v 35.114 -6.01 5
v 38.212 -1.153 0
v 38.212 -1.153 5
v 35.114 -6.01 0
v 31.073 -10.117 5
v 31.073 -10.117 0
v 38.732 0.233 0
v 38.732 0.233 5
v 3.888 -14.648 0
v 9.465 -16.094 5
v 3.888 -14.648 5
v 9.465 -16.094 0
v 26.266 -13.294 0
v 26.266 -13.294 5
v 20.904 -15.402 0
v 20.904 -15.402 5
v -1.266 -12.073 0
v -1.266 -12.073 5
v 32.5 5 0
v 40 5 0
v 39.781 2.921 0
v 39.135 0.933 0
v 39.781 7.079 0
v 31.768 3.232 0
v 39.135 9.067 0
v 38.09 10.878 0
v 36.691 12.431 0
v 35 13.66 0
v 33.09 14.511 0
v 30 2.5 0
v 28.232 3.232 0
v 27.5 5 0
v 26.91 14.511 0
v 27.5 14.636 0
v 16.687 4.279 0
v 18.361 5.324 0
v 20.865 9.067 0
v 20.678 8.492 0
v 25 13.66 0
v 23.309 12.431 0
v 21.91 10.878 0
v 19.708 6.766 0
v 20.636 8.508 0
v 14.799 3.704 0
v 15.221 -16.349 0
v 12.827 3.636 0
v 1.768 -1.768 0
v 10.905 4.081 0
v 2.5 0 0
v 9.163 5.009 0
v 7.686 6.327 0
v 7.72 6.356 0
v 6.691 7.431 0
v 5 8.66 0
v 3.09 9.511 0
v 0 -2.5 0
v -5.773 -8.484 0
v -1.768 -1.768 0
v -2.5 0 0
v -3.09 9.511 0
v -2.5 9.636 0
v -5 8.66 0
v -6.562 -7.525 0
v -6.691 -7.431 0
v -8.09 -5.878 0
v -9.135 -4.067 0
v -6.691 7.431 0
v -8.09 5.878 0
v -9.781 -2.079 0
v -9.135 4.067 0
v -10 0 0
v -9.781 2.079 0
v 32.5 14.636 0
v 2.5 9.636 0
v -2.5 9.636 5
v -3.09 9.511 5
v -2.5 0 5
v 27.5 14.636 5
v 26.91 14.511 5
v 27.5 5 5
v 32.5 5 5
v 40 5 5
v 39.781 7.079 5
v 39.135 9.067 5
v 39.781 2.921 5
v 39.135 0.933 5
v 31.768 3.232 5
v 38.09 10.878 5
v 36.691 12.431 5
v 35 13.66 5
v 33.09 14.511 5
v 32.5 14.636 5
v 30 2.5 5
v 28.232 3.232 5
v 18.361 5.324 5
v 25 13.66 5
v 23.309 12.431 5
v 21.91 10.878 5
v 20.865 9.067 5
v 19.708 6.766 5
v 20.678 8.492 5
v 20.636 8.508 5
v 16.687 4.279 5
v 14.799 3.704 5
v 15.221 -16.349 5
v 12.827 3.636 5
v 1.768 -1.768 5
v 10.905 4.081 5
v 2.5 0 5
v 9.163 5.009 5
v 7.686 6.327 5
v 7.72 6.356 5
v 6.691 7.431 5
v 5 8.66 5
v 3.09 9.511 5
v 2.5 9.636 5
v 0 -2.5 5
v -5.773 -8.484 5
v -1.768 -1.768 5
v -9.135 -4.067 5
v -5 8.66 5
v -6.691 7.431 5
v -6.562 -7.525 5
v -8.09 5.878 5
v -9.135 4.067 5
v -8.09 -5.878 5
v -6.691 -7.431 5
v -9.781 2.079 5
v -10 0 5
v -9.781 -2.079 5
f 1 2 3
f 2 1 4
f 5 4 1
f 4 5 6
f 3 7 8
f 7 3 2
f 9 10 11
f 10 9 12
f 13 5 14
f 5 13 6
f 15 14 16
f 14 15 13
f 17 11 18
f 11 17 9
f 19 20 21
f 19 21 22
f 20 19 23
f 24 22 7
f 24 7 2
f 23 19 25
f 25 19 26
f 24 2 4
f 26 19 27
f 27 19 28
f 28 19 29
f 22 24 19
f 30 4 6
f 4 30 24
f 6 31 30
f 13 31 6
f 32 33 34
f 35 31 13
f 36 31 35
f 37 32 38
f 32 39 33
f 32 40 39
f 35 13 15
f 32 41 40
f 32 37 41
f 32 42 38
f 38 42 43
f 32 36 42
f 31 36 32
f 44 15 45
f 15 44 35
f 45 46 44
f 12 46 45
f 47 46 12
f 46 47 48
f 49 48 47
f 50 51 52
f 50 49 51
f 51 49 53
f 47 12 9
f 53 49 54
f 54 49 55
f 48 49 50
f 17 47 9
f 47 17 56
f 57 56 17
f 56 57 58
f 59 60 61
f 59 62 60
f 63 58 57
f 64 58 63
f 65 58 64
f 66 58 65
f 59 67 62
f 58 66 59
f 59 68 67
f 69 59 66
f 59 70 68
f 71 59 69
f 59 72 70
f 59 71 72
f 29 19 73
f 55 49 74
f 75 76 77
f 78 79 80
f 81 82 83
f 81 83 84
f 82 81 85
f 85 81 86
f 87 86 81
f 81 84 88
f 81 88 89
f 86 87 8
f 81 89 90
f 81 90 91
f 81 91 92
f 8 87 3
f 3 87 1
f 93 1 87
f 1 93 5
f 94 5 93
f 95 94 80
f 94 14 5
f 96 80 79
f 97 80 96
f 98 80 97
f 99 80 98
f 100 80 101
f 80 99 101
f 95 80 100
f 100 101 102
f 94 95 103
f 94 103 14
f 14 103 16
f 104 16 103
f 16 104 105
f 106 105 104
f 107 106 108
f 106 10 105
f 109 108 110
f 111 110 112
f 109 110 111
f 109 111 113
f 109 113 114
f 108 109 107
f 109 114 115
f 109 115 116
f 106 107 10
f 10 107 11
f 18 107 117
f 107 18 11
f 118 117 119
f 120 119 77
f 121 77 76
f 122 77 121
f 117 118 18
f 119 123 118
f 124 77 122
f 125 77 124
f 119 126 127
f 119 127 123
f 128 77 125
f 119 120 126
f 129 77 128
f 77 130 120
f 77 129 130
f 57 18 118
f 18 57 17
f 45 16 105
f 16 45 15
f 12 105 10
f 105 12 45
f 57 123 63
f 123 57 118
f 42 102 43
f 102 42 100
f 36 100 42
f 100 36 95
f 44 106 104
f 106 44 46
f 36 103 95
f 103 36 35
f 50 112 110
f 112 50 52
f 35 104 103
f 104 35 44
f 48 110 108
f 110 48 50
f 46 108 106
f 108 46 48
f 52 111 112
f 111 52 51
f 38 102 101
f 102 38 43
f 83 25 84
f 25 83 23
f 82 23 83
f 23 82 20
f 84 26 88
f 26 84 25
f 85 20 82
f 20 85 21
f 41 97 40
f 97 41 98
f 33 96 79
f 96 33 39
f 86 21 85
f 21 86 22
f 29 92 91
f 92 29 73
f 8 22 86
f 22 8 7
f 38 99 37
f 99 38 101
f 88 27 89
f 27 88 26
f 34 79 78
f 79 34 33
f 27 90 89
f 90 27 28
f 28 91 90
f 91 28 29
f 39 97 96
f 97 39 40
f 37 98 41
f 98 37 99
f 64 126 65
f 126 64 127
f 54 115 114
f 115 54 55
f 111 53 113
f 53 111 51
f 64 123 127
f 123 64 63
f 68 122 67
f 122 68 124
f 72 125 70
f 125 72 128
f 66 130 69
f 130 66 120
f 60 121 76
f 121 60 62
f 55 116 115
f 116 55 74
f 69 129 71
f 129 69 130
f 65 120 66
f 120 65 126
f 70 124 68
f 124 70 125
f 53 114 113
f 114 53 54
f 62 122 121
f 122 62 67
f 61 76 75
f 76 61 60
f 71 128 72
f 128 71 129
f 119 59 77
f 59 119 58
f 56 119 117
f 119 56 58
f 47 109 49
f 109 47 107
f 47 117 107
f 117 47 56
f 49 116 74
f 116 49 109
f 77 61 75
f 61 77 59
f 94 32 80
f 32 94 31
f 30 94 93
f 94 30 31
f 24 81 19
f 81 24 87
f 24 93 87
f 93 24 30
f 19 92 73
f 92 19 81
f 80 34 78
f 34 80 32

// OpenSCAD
// file: arc.scad
/* Yet Another Arc Library
 * Calculates an arc by cutting apart cylinders. Only good in the z plane.
 * What's kind of nice is that you can jsut specify what the coordinates of
 * your arc should start and end at.
 * Only good up to 180 degrees.
 */

function scalar(vec) = sqrt(pow(vec.x, 2) + pow(vec.y, 2) + pow(vec.z, 2));

module arc(startCoordinates, endCoordinates, degrees, height, width) {
	deltaCoordinates = endCoordinates - startCoordinates;
	currArcLength = scalar(deltaCoordinates);
	radius = currArcLength / (2 * sin(degrees/2));
	
	render() {
		translate(endCoordinates)
			rotate(atan2(-deltaCoordinates.y, -deltaCoordinates.x))
				lineUpArc(currArcLength, degrees, radius, height, width);
		translate(endCoordinates)
			cylinder(h = height, d = width);
		translate(startCoordinates)
			cylinder(h = height, d = width);
	}
}

module lineUpArc(currArcLength, degrees, radius, height, width) {
	outerArcDiameter = radius * 2 + width;
	innerArcDiameter = radius * 2 - width;
	translate([currArcLength/2,-cos(degrees / 2)*radius,0])
		rotate(degrees / 2)
			roughArc(outerArcDiameter, innerArcDiameter, degrees, height);
}

module roughArc(outerArcDiameter, innerArcDiameter, degrees, height) {
	difference() {
		rotate(180 - degrees) difference() {
			hollowCylinder(outerArcDiameter, innerArcDiameter, height);
			translate([-outerArcDiameter / 2, -outerArcDiameter / 2, 0])
			cube([outerArcDiameter / 2, outerArcDiameter, height]);
		}
		translate([-outerArcDiameter / 2, -outerArcDiameter / 2, 0])
			cube([outerArcDiameter / 2, outerArcDiameter, height]);
	}
}

module hollowCylinder(outerArcDiameter, innerArcDiameter, height) {
	difference() {
		cylinder(h = height, d = outerArcDiameter);
		cylinder(h = height, d = innerArcDiameter);
	}
}


// BEGIN TESTS
// Several Different Arcs

translate([0, 0, 0])
	arc([0,0,0], [0,5,0], 30, 7, 1);

translate([20, 0, 0])
	arc([0,0,0],  [0,5,0], 45, 7, 1);

translate([40, 0, 0])
	arc([-5,0,0],  [0,5,0], 90, 7, 1);

translate([60, 0, 0])
	arc([5,0,0],  [0,5,0], 135, 7, 1);

translate([80, 0, 0])
	arc([0,0,0],  [0,5,0], 180, 7, 1);
// main file
use<arc.scad>;

module clipMouth(height, mouthWidth, clipDiameter) {
	cylinder(h = height, d = mouthWidth);
	translate([-mouthWidth / 2, 0, 0])
		cube([mouthWidth, clipDiameter/2, height]);
}
module clipFill(height, clipHeadDiameter, clipSeparation, fillWidth) {
	//Clip heads
	cylinder(h = height, d = clipHeadDiameter);
	translate(clipSeparation)
		cylinder(h = height, d = clipHeadDiameter);

	// Filler
	arc([0,0,0], clipSeparation, 120, height, clipHeadDiameter);

}

module clipAssembly(
	height, clipSeparation, clipHeadDiameter, mouthWidth) {
	difference() {
		clipFill(height, clipHeadDiameter, clipSeparation, mouthWidth);
		clipMouth(height, mouthWidth, clipHeadDiameter);
		translate(clipSeparation)
			clipMouth(height, mouthWidth, clipHeadDiameter);
	}
}

clipAssembly(5, [30, 5, 0], 20, 5);
